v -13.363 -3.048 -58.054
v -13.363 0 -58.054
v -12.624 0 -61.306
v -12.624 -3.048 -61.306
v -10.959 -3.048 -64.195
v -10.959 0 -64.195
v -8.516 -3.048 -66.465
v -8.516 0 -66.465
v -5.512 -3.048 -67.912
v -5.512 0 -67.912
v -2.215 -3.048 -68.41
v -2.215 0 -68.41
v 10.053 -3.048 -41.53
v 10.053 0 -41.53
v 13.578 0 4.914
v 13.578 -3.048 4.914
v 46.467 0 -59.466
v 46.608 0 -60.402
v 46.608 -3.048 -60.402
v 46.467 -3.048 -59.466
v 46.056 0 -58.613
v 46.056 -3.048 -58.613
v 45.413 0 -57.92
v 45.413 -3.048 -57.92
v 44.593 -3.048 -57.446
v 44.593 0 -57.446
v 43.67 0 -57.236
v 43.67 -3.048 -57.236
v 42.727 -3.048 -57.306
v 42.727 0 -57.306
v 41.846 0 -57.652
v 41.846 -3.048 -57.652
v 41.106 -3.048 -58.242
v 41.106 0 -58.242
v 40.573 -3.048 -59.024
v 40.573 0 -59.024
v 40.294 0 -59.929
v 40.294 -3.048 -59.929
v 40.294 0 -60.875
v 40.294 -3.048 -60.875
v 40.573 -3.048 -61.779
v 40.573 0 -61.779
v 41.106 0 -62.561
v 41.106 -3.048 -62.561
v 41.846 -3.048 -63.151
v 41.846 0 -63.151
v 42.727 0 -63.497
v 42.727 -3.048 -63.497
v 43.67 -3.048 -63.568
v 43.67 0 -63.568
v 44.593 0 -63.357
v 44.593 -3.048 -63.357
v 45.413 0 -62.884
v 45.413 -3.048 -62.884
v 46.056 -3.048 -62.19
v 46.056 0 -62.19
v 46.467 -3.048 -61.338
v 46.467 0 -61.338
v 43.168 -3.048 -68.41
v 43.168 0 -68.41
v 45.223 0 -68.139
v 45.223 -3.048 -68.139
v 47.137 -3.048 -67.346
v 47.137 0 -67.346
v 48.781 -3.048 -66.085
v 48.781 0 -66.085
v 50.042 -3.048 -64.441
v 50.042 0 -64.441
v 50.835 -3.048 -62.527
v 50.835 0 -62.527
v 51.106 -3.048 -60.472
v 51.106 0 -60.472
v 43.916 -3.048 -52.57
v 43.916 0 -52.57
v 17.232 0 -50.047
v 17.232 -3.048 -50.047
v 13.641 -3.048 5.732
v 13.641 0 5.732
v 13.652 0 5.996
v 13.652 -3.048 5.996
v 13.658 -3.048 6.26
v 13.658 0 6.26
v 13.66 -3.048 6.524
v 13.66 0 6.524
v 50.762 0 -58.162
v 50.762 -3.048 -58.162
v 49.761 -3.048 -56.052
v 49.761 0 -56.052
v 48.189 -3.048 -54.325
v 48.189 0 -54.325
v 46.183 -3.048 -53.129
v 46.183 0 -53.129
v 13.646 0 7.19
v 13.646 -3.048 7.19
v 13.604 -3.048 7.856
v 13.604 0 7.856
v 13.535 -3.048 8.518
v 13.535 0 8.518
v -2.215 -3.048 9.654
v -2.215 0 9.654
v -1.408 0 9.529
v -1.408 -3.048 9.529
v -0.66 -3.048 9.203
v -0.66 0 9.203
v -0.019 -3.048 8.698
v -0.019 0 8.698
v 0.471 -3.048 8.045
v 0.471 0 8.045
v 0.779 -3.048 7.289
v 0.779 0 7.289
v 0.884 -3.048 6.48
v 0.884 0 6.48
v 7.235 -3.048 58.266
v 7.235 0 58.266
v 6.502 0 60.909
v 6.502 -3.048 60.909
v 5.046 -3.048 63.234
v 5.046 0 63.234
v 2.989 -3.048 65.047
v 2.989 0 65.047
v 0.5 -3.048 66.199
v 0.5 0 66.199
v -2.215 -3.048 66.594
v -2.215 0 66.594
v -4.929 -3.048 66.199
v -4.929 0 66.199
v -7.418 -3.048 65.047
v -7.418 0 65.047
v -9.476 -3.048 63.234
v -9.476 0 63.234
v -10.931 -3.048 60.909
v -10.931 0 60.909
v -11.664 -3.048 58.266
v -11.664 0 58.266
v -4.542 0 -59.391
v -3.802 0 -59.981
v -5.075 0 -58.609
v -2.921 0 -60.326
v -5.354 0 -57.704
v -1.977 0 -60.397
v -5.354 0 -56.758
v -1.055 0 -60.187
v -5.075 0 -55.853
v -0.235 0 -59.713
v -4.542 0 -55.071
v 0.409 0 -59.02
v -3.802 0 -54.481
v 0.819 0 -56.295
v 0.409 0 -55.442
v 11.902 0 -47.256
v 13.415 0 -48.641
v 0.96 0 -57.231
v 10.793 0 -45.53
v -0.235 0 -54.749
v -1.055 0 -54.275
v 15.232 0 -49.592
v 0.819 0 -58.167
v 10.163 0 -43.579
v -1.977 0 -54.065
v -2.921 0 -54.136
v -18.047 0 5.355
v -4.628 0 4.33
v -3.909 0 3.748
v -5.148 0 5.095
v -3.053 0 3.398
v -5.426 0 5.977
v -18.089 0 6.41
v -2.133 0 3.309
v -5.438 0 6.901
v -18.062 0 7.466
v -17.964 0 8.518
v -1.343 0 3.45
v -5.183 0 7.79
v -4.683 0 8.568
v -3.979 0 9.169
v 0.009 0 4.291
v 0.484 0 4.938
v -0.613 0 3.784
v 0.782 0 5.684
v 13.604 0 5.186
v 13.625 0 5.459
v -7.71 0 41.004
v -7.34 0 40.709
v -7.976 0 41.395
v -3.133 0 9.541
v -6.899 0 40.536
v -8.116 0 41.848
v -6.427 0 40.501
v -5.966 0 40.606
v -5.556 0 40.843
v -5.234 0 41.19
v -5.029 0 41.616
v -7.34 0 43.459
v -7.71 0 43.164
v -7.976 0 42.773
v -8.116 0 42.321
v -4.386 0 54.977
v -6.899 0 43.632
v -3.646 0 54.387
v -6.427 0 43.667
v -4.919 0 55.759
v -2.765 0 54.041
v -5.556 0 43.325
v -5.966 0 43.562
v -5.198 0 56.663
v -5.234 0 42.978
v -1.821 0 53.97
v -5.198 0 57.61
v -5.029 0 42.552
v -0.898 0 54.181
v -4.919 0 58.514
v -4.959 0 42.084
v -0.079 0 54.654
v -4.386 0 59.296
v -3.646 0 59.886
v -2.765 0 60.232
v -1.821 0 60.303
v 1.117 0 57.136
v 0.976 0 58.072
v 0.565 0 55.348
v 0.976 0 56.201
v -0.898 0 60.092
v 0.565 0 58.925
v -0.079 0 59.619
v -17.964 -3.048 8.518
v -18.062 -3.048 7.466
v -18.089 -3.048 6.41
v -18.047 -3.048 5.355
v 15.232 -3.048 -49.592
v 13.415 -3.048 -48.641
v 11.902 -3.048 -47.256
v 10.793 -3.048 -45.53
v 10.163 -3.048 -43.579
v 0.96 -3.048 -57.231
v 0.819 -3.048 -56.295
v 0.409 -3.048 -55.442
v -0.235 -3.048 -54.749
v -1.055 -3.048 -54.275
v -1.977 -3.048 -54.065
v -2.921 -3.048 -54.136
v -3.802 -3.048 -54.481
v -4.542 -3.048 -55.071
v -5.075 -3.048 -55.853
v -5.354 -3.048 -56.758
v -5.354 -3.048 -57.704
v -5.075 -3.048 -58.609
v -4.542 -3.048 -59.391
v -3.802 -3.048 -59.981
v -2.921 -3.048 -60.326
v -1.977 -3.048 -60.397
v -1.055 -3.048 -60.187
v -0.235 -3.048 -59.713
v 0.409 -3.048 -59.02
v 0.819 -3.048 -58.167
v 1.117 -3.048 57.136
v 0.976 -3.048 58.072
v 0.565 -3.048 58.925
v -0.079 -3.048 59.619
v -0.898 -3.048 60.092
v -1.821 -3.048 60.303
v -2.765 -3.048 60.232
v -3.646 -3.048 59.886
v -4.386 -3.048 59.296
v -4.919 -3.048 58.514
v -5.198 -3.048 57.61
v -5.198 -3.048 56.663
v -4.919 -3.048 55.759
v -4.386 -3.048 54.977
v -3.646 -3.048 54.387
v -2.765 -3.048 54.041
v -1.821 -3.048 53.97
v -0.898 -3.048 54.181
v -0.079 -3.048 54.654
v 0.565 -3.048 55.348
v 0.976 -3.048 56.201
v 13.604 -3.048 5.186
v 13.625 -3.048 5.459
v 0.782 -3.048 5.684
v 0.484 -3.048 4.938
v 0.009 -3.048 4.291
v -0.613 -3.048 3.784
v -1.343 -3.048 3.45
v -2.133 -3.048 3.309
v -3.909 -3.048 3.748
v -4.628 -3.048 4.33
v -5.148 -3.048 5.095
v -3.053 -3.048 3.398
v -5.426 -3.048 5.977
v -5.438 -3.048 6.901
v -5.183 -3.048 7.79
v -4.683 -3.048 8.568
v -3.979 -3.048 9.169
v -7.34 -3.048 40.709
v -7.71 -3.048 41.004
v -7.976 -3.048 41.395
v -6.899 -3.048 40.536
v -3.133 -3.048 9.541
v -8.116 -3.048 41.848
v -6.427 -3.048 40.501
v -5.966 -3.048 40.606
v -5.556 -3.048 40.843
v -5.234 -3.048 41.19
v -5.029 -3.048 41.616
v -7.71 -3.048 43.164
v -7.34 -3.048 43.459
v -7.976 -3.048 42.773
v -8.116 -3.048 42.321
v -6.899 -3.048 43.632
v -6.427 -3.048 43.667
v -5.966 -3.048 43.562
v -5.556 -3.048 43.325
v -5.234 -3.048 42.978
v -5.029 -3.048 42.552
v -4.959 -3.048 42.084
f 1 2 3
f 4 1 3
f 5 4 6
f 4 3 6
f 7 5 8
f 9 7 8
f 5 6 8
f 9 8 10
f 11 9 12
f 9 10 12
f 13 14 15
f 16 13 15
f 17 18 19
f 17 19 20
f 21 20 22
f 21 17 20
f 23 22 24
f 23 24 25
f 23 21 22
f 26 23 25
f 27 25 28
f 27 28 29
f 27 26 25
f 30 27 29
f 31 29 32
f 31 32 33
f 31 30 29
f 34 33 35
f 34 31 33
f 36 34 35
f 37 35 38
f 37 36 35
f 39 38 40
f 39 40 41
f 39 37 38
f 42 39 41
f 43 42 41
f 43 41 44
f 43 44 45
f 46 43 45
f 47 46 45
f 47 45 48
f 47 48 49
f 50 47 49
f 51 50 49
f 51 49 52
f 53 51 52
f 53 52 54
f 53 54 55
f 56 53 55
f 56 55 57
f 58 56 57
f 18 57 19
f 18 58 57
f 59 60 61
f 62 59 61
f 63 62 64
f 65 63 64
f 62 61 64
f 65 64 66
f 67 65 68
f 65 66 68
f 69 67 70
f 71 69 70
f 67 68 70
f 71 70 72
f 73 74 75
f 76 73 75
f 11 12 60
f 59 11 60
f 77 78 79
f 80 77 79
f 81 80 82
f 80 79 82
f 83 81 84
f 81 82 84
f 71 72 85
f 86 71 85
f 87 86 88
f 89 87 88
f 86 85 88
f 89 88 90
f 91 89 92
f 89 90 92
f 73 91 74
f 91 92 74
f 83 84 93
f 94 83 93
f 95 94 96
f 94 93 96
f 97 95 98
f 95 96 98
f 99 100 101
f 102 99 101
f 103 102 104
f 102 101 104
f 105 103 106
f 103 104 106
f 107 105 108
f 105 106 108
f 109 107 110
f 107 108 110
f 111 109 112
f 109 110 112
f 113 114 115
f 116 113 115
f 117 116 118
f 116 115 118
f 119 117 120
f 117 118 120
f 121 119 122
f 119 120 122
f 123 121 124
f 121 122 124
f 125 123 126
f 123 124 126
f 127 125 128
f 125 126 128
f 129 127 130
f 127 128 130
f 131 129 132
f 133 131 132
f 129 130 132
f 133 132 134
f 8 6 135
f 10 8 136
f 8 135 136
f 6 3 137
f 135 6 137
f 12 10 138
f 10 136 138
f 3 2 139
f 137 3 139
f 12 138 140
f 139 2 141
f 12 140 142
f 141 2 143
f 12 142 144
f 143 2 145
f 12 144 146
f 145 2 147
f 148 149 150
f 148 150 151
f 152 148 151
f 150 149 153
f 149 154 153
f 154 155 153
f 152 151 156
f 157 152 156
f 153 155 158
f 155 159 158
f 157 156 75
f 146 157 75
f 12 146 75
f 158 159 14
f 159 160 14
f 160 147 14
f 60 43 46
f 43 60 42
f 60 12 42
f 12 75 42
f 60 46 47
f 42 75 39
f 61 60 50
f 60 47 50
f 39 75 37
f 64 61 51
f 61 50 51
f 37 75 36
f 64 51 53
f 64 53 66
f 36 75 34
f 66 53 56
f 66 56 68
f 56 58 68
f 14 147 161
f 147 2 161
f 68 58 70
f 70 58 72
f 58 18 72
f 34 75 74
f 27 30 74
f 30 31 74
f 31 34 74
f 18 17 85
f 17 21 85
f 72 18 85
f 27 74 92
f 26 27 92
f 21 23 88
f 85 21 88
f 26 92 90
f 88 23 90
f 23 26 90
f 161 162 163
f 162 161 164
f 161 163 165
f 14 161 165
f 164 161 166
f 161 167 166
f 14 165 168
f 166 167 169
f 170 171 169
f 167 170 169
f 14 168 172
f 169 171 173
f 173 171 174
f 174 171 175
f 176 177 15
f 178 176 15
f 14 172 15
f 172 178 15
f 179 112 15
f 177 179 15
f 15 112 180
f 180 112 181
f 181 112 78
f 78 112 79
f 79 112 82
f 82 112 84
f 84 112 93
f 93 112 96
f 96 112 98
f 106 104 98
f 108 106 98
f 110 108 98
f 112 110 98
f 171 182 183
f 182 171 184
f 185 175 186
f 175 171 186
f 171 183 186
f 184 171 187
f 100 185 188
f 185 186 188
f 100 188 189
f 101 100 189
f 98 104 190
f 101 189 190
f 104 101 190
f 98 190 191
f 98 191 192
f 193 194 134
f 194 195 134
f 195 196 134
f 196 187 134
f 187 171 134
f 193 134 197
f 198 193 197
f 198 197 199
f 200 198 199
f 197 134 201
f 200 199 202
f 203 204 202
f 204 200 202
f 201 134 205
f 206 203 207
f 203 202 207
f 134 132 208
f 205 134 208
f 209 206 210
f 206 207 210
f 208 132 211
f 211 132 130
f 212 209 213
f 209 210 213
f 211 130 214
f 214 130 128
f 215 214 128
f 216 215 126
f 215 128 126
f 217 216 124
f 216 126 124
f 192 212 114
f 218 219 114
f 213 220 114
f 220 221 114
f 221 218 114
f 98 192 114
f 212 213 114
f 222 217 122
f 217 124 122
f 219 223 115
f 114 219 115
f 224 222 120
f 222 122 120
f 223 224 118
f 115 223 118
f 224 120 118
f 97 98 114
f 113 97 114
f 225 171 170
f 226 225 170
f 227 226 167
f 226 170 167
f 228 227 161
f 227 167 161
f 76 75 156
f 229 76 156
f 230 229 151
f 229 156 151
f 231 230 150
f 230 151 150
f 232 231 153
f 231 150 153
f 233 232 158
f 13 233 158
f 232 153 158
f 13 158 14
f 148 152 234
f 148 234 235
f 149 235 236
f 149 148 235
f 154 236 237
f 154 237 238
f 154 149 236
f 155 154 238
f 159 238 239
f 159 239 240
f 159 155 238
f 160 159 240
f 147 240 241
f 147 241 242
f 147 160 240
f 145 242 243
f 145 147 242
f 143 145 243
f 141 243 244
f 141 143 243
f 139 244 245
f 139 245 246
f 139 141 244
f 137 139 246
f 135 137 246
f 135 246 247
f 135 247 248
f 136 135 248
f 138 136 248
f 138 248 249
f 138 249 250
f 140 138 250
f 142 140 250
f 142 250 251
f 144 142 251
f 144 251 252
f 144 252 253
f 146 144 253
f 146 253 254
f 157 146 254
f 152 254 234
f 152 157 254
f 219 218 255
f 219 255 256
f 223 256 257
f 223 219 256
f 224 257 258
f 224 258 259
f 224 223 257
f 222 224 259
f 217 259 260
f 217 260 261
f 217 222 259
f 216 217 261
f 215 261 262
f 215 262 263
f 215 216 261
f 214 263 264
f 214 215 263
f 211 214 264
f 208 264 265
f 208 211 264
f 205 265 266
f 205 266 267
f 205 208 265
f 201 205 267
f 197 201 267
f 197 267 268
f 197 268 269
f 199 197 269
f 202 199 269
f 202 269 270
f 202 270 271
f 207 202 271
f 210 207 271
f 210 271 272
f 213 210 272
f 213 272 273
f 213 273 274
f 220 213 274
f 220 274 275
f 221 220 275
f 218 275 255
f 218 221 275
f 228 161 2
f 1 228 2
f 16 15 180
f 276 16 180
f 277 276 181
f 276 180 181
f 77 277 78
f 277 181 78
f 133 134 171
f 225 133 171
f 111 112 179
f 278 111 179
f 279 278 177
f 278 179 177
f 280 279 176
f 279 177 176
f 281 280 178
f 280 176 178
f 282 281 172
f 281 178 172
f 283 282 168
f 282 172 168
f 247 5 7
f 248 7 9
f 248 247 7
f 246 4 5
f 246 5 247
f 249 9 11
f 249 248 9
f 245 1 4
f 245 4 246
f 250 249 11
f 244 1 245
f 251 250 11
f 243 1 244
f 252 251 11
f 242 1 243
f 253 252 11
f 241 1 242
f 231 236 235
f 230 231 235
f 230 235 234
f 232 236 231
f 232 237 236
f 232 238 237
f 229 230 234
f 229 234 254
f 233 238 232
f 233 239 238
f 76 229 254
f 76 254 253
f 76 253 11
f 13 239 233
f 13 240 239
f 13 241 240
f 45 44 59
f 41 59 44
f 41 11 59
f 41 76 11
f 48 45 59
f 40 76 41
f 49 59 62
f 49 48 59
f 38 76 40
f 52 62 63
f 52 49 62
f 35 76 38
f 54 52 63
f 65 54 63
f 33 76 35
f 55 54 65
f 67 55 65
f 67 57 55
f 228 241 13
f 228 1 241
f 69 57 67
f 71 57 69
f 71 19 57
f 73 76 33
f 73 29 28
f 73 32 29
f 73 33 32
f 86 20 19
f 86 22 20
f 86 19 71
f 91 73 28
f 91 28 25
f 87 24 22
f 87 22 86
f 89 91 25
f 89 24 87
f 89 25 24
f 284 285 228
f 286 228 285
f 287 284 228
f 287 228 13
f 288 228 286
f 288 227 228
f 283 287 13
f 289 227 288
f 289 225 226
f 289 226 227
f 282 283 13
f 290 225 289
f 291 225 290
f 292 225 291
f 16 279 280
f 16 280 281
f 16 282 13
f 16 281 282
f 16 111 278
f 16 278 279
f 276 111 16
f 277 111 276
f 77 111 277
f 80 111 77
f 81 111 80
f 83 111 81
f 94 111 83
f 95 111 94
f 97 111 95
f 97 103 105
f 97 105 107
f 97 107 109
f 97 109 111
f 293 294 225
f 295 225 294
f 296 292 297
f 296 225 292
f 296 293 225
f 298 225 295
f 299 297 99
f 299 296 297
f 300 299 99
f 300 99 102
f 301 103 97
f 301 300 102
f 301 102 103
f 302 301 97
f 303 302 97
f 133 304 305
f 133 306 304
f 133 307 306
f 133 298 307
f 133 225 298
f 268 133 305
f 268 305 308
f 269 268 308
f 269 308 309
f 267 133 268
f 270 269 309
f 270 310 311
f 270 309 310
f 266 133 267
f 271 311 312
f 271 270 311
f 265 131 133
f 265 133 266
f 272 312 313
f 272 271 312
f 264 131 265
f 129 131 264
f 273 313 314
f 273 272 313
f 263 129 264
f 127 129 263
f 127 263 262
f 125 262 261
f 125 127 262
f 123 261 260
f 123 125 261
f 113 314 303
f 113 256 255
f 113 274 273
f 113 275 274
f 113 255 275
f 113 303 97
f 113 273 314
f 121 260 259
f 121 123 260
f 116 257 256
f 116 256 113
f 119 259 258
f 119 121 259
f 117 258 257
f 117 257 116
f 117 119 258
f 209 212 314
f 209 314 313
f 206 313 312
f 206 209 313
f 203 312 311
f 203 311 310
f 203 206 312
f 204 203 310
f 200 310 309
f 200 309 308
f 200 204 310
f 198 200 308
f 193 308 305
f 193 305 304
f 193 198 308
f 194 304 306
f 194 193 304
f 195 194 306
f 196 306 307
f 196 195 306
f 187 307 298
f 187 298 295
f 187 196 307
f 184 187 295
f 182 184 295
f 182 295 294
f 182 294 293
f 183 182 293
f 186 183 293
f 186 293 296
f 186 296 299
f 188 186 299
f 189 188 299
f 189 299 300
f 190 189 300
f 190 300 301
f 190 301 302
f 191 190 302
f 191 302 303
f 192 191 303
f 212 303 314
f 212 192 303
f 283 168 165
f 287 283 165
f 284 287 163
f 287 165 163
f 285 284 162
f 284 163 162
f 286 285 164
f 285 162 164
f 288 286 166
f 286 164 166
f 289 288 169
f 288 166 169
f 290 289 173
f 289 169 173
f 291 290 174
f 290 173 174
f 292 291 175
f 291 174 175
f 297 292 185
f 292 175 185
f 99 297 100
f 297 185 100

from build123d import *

# Parameters (mm, degrees)
F0_R     = 1.5875
F0_R_2   = 3.175
F1_DEPTH = 3.048


with BuildPart() as f1:
    # F0 (on Front) → F1 (new body)
    with BuildSketch(Plane.XZ):
        with BuildLine():
            ThreePointArc((7.3102929275, 57.069215628), (4.5204850183, 50.3340235372), (-2.2147070725, 47.544215628))
            Line((-2.2147070725, 47.544215628), (-2.2147070725, 22.3989884319))
            ThreePointArc((-2.2147070725, 22.3989884319), (8.2818372765, 18.4335720405), (13.5345178126, 8.5183656578))
            Line((13.5345178126, 8.5183656578), (7.2348278586, 58.2658419636))
            ThreePointArc((7.2348278586, 58.2658419636), (7.2914079389, 57.6687174136), (7.3102929275, 57.069215628))
        make_face()
        with BuildLine():
            Line((-2.2147070725, 22.3989884319), (-2.2147070725, 47.544215628))
            ThreePointArc((-2.2147070725, 47.544215628), (-9.3604572377, 50.7712890187), (-11.6642420035, 58.2658419636))
            Line((-11.6642420035, 58.2658419636), (-17.9639319576, 8.5183656578))
            ThreePointArc((-17.9639319576, 8.5183656578), (-12.7112514214, 18.4335720405), (-2.2147070725, 22.3989884319))
        make_face()
        with Locations((-6.5460577607, 42.0841127634)):
            Circle(F0_R, mode=Mode.SUBTRACT)
        with BuildLine():
            ThreePointArc((-11.6642420035, 58.2658419636), (-9.3604572377, 50.7712890187), (-2.2147070725, 47.544215628))
            ThreePointArc((-2.2147070725, 47.544215628), (4.5204850183, 50.3340235372), (7.3102929275, 57.069215628))
            ThreePointArc((7.3102929275, 57.069215628), (7.2914079389, 57.6687174136), (7.2348278586, 58.2658419636))
            ThreePointArc((7.2348278586, 58.2658419636), (-2.2147070725, 66.594215628), (-11.6642420035, 58.2658419636))
        make_face()
        with Locations((-2.0584128797, 57.1364536881)):
            Circle(F0_R_2, mode=Mode.SUBTRACT)
        with BuildLine():
            ThreePointArc((13.5345178126, 8.5183656578), (8.2818372765, 18.4335720405), (-2.2147070725, 22.3989884319))
            Line((-2.2147070725, 22.3989884319), (-2.2147070725, 9.6537737107))
            ThreePointArc((-2.2147070725, 9.6537737107), (-0.0192566722, 8.6975480096), (0.8837937295, 6.4796954393))
            ThreePointArc((0.8837937295, 6.4796954393), (0.0092186443, 4.2913923956), (-2.132691443, 3.3086549083))
            Line((-2.132691443, 3.3086549083), (-2.132691443, -9.3507997065))
            ThreePointArc((-2.132691443, -9.3507997065), (8.4566239022, -5.2292375181), (13.5784544993, 4.9141211804))
            Line((13.5784544993, 4.9141211804), (13.6405138302, 5.7317794152))
            ThreePointArc((13.6405138302, 5.7317794152), (13.6553473829, 6.1277604865), (13.6602929275, 6.5239884319))
            ThreePointArc((13.6602929275, 6.5239884319), (13.6288179464, 7.5231580745), (13.5345178126, 8.5183656578))
        make_face()
        with BuildLine():
            Line((-2.2147070725, 9.6537737107), (-2.2147070725, 22.3989884319))
            ThreePointArc((-2.2147070725, 22.3989884319), (-12.7112514214, 18.4335720405), (-17.9639319576, 8.5183656578))
            ThreePointArc((-17.9639319576, 8.5183656578), (-18.0842931558, 6.9385515062), (-18.0465791747, 5.3546079379))
            ThreePointArc((-18.0465791747, 5.3546079379), (-12.9885990445, -5.1352944267), (-2.132691443, -9.3507997065))
            Line((-2.132691443, -9.3507997065), (-2.132691443, 3.3086549083))
            ThreePointArc((-2.132691443, 3.3086549083), (-5.4659410707, 6.4386595058), (-2.2147070725, 9.6537737107))
        make_face()
        with BuildLine():
            ThreePointArc((-2.132691443, -9.3507997065), (-12.9885990445, -5.1352944267), (-18.0465791747, 5.3546079379))
            Line((-18.0465791747, 5.3546079379), (-13.3630327903, -58.0544430316))
            ThreePointArc((-13.3630327903, -58.0544430316), (-10.3772327356, -49.5931738227), (-2.132691443, -46.0526064293))
            Line((-2.132691443, -46.0526064293), (-2.132691443, -9.3507997065))
        make_face()
        with BuildLine():
            ThreePointArc((13.5784544993, 4.9141211804), (8.4566239022, -5.2292375181), (-2.132691443, -9.3507997065))
            Line((-2.132691443, -9.3507997065), (-2.132691443, -46.0526064293))
            ThreePointArc((-2.132691443, -46.0526064293), (5.5920407008, -49.2298811623), (8.9582909491, -56.8741548811))
            Line((8.9582909491, -56.8741548811), (36.0931763244, -56.8741548811))
            ThreePointArc((36.0931763244, -56.8741548811), (39.3418040246, -53.517952967), (43.9155275845, -52.5699413526))
            Line((43.9155275845, -52.5699413526), (17.2323900006, -50.0469673747))
            ThreePointArc((17.2323900006, -50.0469673747), (11.9020918829, -47.2560690917), (10.0533689663, -41.530388798))
            Line((10.0533689663, -41.530388798), (13.5784544993, 4.9141211804))
        make_face()
        with BuildLine():
            ThreePointArc((13.5784544993, 4.9141211804), (13.6147644778, 5.322549528), (13.6405138302, 5.7317794152))
            Line((13.6405138302, 5.7317794152), (13.5784544993, 4.9141211804))
        make_face()
        with BuildLine():
            ThreePointArc((-2.132691443, -46.0526064293), (-10.3772327356, -49.5931738227), (-13.3630327903, -58.0544430316))
            ThreePointArc((-13.3630327903, -58.0544430316), (-9.8225389669, -65.4214900969), (-2.2147070725, -68.4096957193))
            ThreePointArc((-2.2147070725, -68.4096957193), (5.6898240232, -65.1355317353), (8.9639880072, -57.2310006396))
            ThreePointArc((8.9639880072, -57.2310006396), (8.9625636519, -57.0525550234), (8.9582909491, -56.8741548811))
            ThreePointArc((8.9582909491, -56.8741548811), (5.5920407008, -49.2298811623), (-2.132691443, -46.0526064293))
        make_face()
        with Locations((-2.2147070725, -57.2310006396)):
            Circle(F0_R_2, mode=Mode.SUBTRACT)
        with BuildLine():
            ThreePointArc((8.9639880072, -57.2310006396), (5.6898240232, -65.1355317353), (-2.2147070725, -68.4096957193))
            Line((-2.2147070725, -68.4096957193), (43.1683447589, -68.4096957193))
            ThreePointArc((43.1683447589, -68.4096957193), (36.4021288518, -64.6221630142), (36.0931763244, -56.8741548811))
            Line((36.0931763244, -56.8741548811), (8.9582909491, -56.8741548811))
            ThreePointArc((8.9582909491, -56.8741548811), (8.9625636519, -57.0525550234), (8.9639880072, -57.2310006396))
        make_face()
        with BuildLine():
            ThreePointArc((36.0931763244, -56.8741548811), (36.4021288518, -64.6221630142), (43.1683447589, -68.4096957193))
            ThreePointArc((43.1683447589, -68.4096957193), (48.7810048346, -66.084855795), (51.1058447589, -60.4721957193))
            ThreePointArc((51.1058447589, -60.4721957193), (49.0392335301, -55.1302324766), (43.9155275845, -52.5699413526))
            ThreePointArc((43.9155275845, -52.5699413526), (39.3418040246, -53.517952967), (36.0931763244, -56.8741548811))
        make_face()
        with Locations((43.4331535689, -60.4018158402)):
            Circle(F0_R_2, mode=Mode.SUBTRACT)
    extrude(amount=F1_DEPTH)


solid = f1.part
